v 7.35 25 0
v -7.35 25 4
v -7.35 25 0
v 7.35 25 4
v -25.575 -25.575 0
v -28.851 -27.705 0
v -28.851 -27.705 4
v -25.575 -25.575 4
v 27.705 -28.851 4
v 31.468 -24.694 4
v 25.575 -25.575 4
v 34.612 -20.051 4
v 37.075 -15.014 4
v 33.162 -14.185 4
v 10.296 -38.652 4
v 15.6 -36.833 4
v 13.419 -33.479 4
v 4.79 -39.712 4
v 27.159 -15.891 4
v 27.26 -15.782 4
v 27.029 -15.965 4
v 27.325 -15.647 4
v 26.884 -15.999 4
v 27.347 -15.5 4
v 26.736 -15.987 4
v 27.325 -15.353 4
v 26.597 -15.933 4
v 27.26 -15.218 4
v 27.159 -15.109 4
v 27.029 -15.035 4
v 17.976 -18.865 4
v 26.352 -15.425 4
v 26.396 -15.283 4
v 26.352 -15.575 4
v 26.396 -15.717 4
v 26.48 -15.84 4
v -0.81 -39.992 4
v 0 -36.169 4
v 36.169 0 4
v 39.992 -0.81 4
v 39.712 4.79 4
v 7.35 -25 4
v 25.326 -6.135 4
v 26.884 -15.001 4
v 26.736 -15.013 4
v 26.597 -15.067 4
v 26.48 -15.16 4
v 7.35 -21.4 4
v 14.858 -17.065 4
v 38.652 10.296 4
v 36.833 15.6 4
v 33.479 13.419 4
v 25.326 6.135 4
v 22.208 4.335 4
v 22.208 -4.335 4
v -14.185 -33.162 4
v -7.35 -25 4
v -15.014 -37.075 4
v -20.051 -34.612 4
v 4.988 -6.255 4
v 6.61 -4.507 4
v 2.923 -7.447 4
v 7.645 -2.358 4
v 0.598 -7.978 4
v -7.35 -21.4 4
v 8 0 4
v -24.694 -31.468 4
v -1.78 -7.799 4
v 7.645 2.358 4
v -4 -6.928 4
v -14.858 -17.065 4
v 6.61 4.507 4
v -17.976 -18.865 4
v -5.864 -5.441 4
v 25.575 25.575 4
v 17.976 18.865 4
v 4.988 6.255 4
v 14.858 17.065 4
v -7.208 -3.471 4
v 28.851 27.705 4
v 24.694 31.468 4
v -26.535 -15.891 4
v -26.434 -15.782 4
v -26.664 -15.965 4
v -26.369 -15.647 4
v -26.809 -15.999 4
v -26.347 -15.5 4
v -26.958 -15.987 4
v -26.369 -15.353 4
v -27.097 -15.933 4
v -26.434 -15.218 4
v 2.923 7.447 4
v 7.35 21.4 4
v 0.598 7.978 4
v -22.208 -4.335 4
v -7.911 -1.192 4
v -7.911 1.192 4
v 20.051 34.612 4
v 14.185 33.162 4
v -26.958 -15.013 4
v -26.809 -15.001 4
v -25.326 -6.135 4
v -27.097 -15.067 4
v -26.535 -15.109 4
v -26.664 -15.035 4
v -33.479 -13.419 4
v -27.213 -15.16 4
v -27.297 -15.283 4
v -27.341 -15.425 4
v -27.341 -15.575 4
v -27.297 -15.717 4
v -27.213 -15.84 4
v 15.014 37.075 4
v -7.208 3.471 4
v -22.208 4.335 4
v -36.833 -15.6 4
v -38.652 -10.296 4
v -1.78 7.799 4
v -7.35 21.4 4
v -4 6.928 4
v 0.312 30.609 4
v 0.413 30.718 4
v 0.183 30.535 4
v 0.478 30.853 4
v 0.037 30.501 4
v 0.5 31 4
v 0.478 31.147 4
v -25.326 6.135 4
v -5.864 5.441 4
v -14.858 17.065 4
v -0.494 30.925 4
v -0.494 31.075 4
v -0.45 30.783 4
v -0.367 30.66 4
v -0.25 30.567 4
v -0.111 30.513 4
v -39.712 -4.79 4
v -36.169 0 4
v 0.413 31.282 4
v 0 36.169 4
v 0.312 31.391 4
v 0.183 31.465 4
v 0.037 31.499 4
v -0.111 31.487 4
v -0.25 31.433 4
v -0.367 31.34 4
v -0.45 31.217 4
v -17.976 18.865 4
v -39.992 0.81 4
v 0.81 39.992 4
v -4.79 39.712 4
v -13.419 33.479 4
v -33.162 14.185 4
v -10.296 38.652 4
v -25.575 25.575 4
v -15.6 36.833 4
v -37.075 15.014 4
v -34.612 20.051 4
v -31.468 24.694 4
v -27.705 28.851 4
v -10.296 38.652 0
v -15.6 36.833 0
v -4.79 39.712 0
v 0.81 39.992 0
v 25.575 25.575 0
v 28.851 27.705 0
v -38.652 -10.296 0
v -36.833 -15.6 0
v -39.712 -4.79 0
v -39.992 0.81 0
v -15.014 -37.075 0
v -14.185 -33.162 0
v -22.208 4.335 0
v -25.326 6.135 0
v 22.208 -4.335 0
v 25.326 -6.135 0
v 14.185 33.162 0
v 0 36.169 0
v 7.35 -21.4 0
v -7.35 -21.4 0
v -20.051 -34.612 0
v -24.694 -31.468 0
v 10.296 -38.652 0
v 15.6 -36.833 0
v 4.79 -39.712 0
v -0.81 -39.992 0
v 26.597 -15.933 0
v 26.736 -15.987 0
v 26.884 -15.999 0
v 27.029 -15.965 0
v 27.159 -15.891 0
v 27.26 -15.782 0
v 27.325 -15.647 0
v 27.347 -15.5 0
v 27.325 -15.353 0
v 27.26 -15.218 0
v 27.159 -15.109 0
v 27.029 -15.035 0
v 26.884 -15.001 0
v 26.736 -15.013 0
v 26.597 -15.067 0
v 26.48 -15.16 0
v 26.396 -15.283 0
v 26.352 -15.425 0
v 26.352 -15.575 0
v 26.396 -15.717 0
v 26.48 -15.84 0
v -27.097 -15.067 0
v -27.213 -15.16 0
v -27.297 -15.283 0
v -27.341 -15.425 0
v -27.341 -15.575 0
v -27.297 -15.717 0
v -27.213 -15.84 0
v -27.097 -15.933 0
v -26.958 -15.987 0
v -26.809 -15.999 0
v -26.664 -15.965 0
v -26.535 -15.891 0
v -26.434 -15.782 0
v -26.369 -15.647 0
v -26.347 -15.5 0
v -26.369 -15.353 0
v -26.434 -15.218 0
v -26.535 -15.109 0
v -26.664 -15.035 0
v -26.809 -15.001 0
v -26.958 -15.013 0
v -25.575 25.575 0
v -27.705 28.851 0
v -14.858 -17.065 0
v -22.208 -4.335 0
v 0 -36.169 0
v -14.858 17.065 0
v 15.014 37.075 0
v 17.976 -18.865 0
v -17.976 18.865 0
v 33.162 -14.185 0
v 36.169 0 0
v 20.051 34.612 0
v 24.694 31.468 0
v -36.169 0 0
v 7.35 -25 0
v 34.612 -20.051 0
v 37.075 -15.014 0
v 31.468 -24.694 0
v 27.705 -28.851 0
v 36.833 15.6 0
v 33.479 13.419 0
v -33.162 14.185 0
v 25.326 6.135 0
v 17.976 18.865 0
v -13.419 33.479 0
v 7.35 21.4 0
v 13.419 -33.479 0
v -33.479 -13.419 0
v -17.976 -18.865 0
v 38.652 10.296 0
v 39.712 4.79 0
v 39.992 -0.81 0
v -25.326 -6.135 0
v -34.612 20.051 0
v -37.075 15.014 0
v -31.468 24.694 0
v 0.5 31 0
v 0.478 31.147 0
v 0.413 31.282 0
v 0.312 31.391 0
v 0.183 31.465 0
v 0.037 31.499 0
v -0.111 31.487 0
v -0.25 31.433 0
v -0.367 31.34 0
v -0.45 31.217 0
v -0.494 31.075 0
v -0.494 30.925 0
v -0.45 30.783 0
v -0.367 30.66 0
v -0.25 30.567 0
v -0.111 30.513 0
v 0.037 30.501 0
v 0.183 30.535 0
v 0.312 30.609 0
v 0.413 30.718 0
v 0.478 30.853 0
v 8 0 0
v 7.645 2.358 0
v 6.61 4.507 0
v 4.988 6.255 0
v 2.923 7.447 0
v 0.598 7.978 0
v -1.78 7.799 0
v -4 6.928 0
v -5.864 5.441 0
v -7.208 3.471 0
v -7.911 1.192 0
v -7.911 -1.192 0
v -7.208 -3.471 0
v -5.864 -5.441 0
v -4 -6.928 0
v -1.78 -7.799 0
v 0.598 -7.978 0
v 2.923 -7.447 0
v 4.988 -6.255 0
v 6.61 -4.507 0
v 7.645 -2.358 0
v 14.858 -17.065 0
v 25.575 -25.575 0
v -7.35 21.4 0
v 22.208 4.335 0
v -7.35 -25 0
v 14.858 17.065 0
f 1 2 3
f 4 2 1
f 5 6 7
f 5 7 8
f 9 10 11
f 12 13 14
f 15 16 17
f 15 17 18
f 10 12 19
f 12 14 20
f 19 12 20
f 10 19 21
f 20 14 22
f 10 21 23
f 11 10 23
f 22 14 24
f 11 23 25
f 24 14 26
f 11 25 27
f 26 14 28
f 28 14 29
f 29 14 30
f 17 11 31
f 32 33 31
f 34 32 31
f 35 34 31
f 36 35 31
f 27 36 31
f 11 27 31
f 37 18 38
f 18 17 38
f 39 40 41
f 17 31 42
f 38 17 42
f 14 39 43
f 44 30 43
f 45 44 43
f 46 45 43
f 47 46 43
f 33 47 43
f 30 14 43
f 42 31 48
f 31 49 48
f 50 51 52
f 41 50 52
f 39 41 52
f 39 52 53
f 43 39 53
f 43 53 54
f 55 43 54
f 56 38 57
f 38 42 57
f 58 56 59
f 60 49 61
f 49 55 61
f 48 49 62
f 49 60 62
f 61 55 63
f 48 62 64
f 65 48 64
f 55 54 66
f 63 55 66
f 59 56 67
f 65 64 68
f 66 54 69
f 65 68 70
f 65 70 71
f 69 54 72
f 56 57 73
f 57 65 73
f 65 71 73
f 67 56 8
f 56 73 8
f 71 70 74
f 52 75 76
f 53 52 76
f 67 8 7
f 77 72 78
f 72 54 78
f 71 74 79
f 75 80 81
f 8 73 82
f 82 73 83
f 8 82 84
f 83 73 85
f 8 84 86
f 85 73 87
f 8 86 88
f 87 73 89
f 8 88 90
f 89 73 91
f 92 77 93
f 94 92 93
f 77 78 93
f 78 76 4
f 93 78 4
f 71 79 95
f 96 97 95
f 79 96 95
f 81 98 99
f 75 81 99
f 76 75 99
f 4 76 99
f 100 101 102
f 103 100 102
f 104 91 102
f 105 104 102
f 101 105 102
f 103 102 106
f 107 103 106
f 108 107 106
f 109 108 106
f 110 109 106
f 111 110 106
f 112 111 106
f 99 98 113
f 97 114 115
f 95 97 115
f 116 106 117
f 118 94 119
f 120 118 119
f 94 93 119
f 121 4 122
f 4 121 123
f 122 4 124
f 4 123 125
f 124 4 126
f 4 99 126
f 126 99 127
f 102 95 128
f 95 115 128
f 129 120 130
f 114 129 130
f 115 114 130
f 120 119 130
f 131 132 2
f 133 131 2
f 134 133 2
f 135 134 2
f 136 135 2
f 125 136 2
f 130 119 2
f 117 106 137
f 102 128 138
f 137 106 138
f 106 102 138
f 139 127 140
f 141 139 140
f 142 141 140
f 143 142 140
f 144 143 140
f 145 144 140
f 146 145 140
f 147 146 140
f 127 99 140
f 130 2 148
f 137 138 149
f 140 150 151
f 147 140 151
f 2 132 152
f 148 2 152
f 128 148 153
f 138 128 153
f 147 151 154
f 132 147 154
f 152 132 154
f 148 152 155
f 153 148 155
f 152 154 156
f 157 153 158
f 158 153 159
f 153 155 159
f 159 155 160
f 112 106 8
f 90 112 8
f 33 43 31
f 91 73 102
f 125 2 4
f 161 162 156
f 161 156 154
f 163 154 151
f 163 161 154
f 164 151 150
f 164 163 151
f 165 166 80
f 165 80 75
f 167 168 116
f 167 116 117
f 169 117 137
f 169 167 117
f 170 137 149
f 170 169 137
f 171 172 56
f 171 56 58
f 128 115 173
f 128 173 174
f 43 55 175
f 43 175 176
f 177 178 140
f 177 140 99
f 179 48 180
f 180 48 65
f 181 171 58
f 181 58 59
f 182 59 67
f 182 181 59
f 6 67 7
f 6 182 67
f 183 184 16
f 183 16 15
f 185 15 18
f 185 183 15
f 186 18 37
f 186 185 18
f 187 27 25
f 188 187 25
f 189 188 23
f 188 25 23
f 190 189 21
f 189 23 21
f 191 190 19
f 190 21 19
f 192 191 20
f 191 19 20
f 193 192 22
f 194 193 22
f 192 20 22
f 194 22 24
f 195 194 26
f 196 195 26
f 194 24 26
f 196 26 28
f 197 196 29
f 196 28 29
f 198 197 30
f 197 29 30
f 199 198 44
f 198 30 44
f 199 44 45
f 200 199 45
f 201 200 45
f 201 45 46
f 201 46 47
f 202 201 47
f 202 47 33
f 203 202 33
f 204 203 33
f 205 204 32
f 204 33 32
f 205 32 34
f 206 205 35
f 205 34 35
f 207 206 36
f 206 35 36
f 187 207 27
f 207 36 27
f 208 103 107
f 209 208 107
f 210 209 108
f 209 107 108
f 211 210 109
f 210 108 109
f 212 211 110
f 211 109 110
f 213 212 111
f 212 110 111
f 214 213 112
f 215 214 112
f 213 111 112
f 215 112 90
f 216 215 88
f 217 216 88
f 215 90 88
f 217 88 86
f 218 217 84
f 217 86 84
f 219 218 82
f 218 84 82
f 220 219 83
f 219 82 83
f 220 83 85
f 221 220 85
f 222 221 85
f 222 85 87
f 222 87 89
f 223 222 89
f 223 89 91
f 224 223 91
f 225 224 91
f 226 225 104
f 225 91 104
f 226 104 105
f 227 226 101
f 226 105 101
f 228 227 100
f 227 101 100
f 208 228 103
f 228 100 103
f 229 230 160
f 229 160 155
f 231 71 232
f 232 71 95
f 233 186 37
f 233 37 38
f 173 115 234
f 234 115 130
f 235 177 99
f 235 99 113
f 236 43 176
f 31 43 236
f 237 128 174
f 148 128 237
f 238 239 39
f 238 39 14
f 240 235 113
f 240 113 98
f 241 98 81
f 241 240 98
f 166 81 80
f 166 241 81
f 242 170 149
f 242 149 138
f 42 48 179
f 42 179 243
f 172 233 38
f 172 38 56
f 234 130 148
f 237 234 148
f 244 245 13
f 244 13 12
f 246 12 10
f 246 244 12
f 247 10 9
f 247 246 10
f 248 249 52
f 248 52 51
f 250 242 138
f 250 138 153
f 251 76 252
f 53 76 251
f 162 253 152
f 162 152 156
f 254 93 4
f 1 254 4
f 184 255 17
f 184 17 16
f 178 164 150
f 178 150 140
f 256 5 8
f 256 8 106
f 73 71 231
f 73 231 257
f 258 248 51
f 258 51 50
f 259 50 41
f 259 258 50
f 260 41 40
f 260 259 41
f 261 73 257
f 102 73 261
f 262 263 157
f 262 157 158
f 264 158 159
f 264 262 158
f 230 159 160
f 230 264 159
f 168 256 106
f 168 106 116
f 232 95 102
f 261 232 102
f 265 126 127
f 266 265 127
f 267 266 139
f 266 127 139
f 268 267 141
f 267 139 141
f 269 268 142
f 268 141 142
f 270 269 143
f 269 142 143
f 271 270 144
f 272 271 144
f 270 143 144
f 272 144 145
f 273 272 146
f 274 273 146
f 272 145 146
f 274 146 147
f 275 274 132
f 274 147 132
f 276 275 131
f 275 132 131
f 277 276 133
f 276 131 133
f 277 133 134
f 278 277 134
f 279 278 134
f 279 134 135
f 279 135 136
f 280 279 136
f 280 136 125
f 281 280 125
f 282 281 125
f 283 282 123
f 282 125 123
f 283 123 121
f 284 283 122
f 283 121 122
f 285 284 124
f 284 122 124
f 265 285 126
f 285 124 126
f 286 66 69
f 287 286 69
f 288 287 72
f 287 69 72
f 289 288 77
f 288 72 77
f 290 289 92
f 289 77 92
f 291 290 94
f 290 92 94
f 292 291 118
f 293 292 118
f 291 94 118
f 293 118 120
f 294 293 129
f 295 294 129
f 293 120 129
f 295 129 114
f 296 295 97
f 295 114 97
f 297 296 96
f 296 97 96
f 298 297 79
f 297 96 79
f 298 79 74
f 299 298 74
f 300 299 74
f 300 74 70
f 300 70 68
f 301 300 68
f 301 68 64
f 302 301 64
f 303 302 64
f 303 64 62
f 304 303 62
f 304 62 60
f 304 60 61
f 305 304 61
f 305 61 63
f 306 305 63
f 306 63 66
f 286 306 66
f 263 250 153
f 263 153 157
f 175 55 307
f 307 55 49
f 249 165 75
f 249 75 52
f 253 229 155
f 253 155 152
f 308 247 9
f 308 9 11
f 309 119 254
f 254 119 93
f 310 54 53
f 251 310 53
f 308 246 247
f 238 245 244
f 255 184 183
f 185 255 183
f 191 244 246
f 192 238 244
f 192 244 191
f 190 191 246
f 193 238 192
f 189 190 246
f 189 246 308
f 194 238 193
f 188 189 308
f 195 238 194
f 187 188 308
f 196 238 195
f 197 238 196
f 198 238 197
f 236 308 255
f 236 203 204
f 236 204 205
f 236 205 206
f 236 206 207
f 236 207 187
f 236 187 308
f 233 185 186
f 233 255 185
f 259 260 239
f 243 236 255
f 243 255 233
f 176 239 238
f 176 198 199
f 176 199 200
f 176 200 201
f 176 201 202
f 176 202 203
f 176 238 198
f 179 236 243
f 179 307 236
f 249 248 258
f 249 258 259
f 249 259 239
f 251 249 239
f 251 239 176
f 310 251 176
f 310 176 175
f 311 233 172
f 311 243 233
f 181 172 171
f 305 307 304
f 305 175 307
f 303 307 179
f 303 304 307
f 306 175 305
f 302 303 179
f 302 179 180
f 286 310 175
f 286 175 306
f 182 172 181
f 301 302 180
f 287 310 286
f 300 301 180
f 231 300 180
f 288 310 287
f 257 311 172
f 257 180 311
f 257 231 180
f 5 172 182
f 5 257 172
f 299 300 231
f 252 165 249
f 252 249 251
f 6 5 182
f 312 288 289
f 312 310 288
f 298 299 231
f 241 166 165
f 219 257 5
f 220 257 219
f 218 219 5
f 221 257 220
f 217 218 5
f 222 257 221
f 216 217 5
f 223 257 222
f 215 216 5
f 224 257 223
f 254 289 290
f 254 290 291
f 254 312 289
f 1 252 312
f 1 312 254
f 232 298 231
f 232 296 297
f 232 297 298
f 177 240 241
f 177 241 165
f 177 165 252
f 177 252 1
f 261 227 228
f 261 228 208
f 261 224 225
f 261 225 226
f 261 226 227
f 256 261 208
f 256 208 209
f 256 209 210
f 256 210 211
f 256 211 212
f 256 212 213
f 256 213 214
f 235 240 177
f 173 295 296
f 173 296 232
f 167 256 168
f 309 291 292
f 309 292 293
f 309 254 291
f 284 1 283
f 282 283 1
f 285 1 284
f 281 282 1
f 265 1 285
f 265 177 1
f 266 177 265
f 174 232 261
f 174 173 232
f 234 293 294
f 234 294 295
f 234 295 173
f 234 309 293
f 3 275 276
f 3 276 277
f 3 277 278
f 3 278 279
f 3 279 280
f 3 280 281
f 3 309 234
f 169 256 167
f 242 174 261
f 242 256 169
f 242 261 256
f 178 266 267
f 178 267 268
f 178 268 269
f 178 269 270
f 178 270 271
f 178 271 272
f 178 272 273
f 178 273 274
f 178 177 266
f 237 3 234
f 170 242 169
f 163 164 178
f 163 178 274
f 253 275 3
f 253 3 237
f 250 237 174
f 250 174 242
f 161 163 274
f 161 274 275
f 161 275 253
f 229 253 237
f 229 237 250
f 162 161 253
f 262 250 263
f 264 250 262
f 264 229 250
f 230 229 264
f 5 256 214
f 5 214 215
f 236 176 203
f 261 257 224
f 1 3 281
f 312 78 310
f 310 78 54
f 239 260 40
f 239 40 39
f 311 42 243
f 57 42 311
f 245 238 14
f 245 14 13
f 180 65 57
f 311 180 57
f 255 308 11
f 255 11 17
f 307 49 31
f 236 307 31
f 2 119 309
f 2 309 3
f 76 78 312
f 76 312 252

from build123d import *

# Parameters (mm, degrees)
AUFSATZ_LINEAR_AUSTRAGEN1_DEPTH = 4
SCHNITT_LINEAR_AUSTRAGEN1_REACH = 6
SKIZZE2_R                       = 8
SKIZZE4_W                       = 14.7
SKIZZE4_H                       = 3.6
SCHNITT_LINEAR_AUSTRAGEN2_DEPTH = 4
KREISMUSTER1_COUNT              = 6
SKIZZE5_R                       = 0.5
SCHNITT_LINEAR_AUSTRAGEN3_DEPTH = 4
KREISMUSTER2_COUNT              = 3


with BuildPart() as part:
    # Skizze1 → Aufsatz-Linear austragen1 (new body)
    with BuildSketch(Plane.XY):
        with BuildLine():
            Line((0, 36.168934028), (14.18455057, 33.162270875))
            Line((14.18455057, 33.162270875), (15.013991658, 37.075329459))
            ThreePointArc((15.013991658, 37.075329459), (22.427500118, 33.121099596), (28.851450623, 27.705483157))
            Line((28.851450623, 27.705483157), (25.57529852, 25.57529852))
            Line((25.57529852, 25.57529852), (33.479258511, 13.41927472))
            Line((33.479258511, 13.41927472), (36.832712189, 15.599721561))
            ThreePointArc((36.832712189, 15.599721561), (39.278791543, 7.561516706), (39.991791399, -0.810321366))
            Line((39.991791399, -0.810321366), (36.168934028, 0))
            Line((36.168934028, 0), (33.162270875, -14.18455057))
            Line((33.162270875, -14.18455057), (37.075329459, -15.013991658))
            ThreePointArc((37.075329459, -15.013991658), (33.121099596, -22.427500118), (27.705483157, -28.851450623))
            Line((27.705483157, -28.851450623), (25.57529852, -25.57529852))
            Line((25.57529852, -25.57529852), (13.41927472, -33.479258511))
            Line((13.41927472, -33.479258511), (15.599721561, -36.832712189))
            ThreePointArc((15.599721561, -36.832712189), (7.561516706, -39.278791543), (-0.810321366, -39.991791399))
            Line((-0.810321366, -39.991791399), (0, -36.168934028))
            Line((0, -36.168934028), (-14.18455057, -33.162270875))
            Line((-14.18455057, -33.162270875), (-15.013991658, -37.075329459))
            ThreePointArc((-15.013991658, -37.075329459), (-22.427500118, -33.121099596), (-28.851450623, -27.705483157))
            Line((-28.851450623, -27.705483157), (-25.57529852, -25.57529852))
            Line((-25.57529852, -25.57529852), (-33.479258511, -13.41927472))
            Line((-33.479258511, -13.41927472), (-36.832712189, -15.599721561))
            ThreePointArc((-36.832712189, -15.599721561), (-39.278791543, -7.561516706), (-39.991791399, 0.810321366))
            Line((-39.991791399, 0.810321366), (-36.168934028, 0))
            Line((-36.168934028, 0), (-33.162270875, 14.18455057))
            Line((-33.162270875, 14.18455057), (-37.075329459, 15.013991658))
            ThreePointArc((-37.075329459, 15.013991658), (-33.121099596, 22.427500118), (-27.705483157, 28.851450623))
            Line((-27.705483157, 28.851450623), (-25.57529852, 25.57529852))
            Line((-25.57529852, 25.57529852), (-13.41927472, 33.479258511))
            Line((-13.41927472, 33.479258511), (-15.599721561, 36.832712189))
            ThreePointArc((-15.599721561, 36.832712189), (-7.561516706, 39.278791543), (0.810321366, 39.991791399))
            Line((0.810321366, 39.991791399), (0, 36.168934028))
        make_face()
    extrude(amount=AUFSATZ_LINEAR_AUSTRAGEN1_DEPTH)

    # Skizze2 → Schnitt-Linear austragen1 (cut, up to next)
    with BuildSketch(Plane.XY.offset(4), mode=Mode.PRIVATE) as schnitt_linear_austragen1_sk1:
        Circle(SKIZZE2_R)
    schnitt_linear_austragen1_tool1 = extrude(schnitt_linear_austragen1_sk1.sketch, amount=-SCHNITT_LINEAR_AUSTRAGEN1_REACH, mode=Mode.PRIVATE) & part.part
    add(schnitt_linear_austragen1_tool1.solids().sort_by_distance((0, 0, 4))[0], mode=Mode.SUBTRACT)

    # Skizze4 → Schnitt-Linear austragen2 (cut)
    with BuildSketch(Plane.XY.offset(4)):
        with Locations((0, 23.2)):
            Rectangle(SKIZZE4_W, SKIZZE4_H)
    schnitt_linear_austragen2 = extrude(amount=-SCHNITT_LINEAR_AUSTRAGEN2_DEPTH, mode=Mode.SUBTRACT)

    # Kreismuster1: Schnitt-Linear austragen2 ×6 about axis
    kreismuster1_axis = Axis((0, 0, 0), (0, 0, 1))
    for i in range(1, KREISMUSTER1_COUNT):
        add(schnitt_linear_austragen2.rotate(kreismuster1_axis, i * 360 / KREISMUSTER1_COUNT), mode=Mode.SUBTRACT)

    # Skizze5 → Schnitt-Linear austragen3 (cut)
    with BuildSketch(Plane.XY.offset(4)):
        with Locations((0, 31)):
            Circle(SKIZZE5_R)
    schnitt_linear_austragen3 = extrude(amount=-SCHNITT_LINEAR_AUSTRAGEN3_DEPTH, mode=Mode.SUBTRACT)

    # Kreismuster2: Schnitt-Linear austragen3 ×3 about axis
    kreismuster2_axis = Axis((0, 0, 0), (0, 0, 1))
    for i in range(1, KREISMUSTER2_COUNT):
        add(schnitt_linear_austragen3.rotate(kreismuster2_axis, i * 360 / KREISMUSTER2_COUNT), mode=Mode.SUBTRACT)


solid = part.part
